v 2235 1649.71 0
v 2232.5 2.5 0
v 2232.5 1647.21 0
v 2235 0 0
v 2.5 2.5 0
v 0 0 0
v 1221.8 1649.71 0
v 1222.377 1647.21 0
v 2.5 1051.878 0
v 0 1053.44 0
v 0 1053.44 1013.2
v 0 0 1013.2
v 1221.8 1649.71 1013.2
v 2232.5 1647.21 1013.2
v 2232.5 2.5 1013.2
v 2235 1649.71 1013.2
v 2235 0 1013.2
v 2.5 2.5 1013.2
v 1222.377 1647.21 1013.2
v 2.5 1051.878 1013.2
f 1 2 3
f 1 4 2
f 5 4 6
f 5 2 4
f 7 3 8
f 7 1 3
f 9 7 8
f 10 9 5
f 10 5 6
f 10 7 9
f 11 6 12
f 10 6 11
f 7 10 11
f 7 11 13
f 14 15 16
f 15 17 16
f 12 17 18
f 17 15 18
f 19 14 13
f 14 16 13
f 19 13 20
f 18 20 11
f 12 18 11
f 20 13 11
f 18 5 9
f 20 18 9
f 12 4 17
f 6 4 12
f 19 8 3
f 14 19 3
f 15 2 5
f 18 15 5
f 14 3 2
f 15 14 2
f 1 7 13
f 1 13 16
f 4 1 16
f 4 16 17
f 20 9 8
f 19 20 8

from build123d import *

# Parameters (mm, degrees)
BOSS_EXTRUDE1_DEPTH = 1013.2


with BuildPart() as part:
    # Sketch1 → Boss-Extrude1 (new body)
    with BuildSketch(Plane.XY):
        Polygon((1221.8, 1649.71), (2235, 1649.71), (2235, 0), (0, 0), (0, 1053.44), align=None)
        Polygon((2.5, 1051.878238321), (1222.377482381, 1647.21), (2232.5, 1647.21), (2232.5, 2.5), (2.5, 2.5), align=None, mode=Mode.SUBTRACT)
    extrude(amount=BOSS_EXTRUDE1_DEPTH)


solid = part.part
